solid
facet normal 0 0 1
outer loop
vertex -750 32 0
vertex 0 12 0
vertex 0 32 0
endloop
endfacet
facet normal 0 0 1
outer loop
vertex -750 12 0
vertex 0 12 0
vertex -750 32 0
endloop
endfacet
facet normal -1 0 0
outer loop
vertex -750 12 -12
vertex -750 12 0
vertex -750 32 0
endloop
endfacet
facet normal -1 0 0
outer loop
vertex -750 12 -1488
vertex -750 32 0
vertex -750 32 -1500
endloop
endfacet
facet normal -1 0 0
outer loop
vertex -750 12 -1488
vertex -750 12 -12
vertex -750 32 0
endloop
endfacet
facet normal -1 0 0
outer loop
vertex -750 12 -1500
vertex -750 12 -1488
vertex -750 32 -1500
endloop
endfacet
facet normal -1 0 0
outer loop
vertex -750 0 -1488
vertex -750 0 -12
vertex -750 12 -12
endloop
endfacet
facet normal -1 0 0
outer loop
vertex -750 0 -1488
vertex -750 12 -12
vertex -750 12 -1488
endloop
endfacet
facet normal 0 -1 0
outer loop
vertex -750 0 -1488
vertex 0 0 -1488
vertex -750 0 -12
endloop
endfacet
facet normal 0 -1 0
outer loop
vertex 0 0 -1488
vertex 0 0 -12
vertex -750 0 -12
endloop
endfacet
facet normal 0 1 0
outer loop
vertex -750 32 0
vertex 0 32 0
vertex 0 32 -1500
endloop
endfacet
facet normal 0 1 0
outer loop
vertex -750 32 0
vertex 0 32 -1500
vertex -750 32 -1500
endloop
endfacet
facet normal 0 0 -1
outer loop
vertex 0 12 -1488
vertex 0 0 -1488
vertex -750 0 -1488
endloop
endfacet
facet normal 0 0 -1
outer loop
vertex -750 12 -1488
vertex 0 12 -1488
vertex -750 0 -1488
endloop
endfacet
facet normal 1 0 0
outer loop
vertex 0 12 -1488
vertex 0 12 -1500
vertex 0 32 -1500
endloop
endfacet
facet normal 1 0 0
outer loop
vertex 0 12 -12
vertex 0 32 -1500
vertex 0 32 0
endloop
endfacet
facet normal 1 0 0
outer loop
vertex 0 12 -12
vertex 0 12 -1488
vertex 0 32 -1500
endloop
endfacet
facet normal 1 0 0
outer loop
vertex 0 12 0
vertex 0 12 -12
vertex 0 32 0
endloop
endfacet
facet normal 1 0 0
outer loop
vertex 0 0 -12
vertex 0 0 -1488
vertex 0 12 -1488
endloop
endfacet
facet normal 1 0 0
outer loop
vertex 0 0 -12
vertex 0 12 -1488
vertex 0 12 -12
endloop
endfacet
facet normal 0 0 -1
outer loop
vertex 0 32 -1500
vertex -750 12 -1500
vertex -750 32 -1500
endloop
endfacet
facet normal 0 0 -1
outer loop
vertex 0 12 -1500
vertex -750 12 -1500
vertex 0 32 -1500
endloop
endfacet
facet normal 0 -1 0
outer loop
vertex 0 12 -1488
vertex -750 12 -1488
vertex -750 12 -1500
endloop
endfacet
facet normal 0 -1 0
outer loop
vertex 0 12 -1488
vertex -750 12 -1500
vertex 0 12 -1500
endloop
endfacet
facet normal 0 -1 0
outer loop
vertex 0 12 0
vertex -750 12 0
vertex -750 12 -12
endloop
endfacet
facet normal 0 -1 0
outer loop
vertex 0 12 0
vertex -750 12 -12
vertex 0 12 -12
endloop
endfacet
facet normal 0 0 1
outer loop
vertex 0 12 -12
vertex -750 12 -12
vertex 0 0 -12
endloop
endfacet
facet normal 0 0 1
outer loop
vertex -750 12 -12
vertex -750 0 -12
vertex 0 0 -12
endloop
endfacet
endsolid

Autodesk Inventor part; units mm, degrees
ref_plane "YZ Plane" through (0, 0, 0) normal (1, 0, 0) x (0, 1, 0)
ref_plane "XZ Plane" through (0, 0, 0) normal (0, 1, 0) x (-1, 0, 0)
ref_plane "XY Plane" through (0, 0, 0) normal (0, 0, 1) x (1, 0, 0)
sketch "Sketch1" plane through (0, 0, 0) normal (0, 1, 0) x (-1, 0, 0)
  line L0 (0, 0) -> (750, 0)
  line L1 (750, 0) -> (750, -1500)
  line L2 (750, -1500) -> (0, -1500)
  line L3 (0, -1500) -> (0, 0)
  dimension "d0" = 750
  dimension "d1" = 1500
extrude "Extrusion1" add sketch "Sketch1" along normal blind 32
sketch "Sketch3" plane through (0, 0, 0) normal (0, -1, 0) x (1, 0, 0)
  line L0 (-750, 0) -> (0, 0) projected
  line L1 (-750, -1500) -> (-750, 0) projected
  line L2 (0, 0) -> (-750, 0)
  line L3 (-750, 0) -> (-750, -12)
  line L4 (-750, -12) -> (0, -12)
  line L5 (0, -12) -> (0, 0)
  line L6 (0, -1500) -> (-750, -1500) projected
  line L7 (0, 0) -> (0, -1500) projected
  line L8 (-750, -1500) -> (0, -1500)
  line L9 (0, -1500) -> (0, -1488)
  line L10 (0, -1488) -> (-750, -1488)
  line L11 (-750, -1488) -> (-750, -1500)
  dimension "d4" = 12
  dimension "d5" = 12
extrude "Extrusion2" cut sketch "Sketch3" against normal blind 12 contours L0 L5 L4 L1 | L10 L7 L6 L1
properties part number "desk" material "MDF Medium Density Fiberboard"
